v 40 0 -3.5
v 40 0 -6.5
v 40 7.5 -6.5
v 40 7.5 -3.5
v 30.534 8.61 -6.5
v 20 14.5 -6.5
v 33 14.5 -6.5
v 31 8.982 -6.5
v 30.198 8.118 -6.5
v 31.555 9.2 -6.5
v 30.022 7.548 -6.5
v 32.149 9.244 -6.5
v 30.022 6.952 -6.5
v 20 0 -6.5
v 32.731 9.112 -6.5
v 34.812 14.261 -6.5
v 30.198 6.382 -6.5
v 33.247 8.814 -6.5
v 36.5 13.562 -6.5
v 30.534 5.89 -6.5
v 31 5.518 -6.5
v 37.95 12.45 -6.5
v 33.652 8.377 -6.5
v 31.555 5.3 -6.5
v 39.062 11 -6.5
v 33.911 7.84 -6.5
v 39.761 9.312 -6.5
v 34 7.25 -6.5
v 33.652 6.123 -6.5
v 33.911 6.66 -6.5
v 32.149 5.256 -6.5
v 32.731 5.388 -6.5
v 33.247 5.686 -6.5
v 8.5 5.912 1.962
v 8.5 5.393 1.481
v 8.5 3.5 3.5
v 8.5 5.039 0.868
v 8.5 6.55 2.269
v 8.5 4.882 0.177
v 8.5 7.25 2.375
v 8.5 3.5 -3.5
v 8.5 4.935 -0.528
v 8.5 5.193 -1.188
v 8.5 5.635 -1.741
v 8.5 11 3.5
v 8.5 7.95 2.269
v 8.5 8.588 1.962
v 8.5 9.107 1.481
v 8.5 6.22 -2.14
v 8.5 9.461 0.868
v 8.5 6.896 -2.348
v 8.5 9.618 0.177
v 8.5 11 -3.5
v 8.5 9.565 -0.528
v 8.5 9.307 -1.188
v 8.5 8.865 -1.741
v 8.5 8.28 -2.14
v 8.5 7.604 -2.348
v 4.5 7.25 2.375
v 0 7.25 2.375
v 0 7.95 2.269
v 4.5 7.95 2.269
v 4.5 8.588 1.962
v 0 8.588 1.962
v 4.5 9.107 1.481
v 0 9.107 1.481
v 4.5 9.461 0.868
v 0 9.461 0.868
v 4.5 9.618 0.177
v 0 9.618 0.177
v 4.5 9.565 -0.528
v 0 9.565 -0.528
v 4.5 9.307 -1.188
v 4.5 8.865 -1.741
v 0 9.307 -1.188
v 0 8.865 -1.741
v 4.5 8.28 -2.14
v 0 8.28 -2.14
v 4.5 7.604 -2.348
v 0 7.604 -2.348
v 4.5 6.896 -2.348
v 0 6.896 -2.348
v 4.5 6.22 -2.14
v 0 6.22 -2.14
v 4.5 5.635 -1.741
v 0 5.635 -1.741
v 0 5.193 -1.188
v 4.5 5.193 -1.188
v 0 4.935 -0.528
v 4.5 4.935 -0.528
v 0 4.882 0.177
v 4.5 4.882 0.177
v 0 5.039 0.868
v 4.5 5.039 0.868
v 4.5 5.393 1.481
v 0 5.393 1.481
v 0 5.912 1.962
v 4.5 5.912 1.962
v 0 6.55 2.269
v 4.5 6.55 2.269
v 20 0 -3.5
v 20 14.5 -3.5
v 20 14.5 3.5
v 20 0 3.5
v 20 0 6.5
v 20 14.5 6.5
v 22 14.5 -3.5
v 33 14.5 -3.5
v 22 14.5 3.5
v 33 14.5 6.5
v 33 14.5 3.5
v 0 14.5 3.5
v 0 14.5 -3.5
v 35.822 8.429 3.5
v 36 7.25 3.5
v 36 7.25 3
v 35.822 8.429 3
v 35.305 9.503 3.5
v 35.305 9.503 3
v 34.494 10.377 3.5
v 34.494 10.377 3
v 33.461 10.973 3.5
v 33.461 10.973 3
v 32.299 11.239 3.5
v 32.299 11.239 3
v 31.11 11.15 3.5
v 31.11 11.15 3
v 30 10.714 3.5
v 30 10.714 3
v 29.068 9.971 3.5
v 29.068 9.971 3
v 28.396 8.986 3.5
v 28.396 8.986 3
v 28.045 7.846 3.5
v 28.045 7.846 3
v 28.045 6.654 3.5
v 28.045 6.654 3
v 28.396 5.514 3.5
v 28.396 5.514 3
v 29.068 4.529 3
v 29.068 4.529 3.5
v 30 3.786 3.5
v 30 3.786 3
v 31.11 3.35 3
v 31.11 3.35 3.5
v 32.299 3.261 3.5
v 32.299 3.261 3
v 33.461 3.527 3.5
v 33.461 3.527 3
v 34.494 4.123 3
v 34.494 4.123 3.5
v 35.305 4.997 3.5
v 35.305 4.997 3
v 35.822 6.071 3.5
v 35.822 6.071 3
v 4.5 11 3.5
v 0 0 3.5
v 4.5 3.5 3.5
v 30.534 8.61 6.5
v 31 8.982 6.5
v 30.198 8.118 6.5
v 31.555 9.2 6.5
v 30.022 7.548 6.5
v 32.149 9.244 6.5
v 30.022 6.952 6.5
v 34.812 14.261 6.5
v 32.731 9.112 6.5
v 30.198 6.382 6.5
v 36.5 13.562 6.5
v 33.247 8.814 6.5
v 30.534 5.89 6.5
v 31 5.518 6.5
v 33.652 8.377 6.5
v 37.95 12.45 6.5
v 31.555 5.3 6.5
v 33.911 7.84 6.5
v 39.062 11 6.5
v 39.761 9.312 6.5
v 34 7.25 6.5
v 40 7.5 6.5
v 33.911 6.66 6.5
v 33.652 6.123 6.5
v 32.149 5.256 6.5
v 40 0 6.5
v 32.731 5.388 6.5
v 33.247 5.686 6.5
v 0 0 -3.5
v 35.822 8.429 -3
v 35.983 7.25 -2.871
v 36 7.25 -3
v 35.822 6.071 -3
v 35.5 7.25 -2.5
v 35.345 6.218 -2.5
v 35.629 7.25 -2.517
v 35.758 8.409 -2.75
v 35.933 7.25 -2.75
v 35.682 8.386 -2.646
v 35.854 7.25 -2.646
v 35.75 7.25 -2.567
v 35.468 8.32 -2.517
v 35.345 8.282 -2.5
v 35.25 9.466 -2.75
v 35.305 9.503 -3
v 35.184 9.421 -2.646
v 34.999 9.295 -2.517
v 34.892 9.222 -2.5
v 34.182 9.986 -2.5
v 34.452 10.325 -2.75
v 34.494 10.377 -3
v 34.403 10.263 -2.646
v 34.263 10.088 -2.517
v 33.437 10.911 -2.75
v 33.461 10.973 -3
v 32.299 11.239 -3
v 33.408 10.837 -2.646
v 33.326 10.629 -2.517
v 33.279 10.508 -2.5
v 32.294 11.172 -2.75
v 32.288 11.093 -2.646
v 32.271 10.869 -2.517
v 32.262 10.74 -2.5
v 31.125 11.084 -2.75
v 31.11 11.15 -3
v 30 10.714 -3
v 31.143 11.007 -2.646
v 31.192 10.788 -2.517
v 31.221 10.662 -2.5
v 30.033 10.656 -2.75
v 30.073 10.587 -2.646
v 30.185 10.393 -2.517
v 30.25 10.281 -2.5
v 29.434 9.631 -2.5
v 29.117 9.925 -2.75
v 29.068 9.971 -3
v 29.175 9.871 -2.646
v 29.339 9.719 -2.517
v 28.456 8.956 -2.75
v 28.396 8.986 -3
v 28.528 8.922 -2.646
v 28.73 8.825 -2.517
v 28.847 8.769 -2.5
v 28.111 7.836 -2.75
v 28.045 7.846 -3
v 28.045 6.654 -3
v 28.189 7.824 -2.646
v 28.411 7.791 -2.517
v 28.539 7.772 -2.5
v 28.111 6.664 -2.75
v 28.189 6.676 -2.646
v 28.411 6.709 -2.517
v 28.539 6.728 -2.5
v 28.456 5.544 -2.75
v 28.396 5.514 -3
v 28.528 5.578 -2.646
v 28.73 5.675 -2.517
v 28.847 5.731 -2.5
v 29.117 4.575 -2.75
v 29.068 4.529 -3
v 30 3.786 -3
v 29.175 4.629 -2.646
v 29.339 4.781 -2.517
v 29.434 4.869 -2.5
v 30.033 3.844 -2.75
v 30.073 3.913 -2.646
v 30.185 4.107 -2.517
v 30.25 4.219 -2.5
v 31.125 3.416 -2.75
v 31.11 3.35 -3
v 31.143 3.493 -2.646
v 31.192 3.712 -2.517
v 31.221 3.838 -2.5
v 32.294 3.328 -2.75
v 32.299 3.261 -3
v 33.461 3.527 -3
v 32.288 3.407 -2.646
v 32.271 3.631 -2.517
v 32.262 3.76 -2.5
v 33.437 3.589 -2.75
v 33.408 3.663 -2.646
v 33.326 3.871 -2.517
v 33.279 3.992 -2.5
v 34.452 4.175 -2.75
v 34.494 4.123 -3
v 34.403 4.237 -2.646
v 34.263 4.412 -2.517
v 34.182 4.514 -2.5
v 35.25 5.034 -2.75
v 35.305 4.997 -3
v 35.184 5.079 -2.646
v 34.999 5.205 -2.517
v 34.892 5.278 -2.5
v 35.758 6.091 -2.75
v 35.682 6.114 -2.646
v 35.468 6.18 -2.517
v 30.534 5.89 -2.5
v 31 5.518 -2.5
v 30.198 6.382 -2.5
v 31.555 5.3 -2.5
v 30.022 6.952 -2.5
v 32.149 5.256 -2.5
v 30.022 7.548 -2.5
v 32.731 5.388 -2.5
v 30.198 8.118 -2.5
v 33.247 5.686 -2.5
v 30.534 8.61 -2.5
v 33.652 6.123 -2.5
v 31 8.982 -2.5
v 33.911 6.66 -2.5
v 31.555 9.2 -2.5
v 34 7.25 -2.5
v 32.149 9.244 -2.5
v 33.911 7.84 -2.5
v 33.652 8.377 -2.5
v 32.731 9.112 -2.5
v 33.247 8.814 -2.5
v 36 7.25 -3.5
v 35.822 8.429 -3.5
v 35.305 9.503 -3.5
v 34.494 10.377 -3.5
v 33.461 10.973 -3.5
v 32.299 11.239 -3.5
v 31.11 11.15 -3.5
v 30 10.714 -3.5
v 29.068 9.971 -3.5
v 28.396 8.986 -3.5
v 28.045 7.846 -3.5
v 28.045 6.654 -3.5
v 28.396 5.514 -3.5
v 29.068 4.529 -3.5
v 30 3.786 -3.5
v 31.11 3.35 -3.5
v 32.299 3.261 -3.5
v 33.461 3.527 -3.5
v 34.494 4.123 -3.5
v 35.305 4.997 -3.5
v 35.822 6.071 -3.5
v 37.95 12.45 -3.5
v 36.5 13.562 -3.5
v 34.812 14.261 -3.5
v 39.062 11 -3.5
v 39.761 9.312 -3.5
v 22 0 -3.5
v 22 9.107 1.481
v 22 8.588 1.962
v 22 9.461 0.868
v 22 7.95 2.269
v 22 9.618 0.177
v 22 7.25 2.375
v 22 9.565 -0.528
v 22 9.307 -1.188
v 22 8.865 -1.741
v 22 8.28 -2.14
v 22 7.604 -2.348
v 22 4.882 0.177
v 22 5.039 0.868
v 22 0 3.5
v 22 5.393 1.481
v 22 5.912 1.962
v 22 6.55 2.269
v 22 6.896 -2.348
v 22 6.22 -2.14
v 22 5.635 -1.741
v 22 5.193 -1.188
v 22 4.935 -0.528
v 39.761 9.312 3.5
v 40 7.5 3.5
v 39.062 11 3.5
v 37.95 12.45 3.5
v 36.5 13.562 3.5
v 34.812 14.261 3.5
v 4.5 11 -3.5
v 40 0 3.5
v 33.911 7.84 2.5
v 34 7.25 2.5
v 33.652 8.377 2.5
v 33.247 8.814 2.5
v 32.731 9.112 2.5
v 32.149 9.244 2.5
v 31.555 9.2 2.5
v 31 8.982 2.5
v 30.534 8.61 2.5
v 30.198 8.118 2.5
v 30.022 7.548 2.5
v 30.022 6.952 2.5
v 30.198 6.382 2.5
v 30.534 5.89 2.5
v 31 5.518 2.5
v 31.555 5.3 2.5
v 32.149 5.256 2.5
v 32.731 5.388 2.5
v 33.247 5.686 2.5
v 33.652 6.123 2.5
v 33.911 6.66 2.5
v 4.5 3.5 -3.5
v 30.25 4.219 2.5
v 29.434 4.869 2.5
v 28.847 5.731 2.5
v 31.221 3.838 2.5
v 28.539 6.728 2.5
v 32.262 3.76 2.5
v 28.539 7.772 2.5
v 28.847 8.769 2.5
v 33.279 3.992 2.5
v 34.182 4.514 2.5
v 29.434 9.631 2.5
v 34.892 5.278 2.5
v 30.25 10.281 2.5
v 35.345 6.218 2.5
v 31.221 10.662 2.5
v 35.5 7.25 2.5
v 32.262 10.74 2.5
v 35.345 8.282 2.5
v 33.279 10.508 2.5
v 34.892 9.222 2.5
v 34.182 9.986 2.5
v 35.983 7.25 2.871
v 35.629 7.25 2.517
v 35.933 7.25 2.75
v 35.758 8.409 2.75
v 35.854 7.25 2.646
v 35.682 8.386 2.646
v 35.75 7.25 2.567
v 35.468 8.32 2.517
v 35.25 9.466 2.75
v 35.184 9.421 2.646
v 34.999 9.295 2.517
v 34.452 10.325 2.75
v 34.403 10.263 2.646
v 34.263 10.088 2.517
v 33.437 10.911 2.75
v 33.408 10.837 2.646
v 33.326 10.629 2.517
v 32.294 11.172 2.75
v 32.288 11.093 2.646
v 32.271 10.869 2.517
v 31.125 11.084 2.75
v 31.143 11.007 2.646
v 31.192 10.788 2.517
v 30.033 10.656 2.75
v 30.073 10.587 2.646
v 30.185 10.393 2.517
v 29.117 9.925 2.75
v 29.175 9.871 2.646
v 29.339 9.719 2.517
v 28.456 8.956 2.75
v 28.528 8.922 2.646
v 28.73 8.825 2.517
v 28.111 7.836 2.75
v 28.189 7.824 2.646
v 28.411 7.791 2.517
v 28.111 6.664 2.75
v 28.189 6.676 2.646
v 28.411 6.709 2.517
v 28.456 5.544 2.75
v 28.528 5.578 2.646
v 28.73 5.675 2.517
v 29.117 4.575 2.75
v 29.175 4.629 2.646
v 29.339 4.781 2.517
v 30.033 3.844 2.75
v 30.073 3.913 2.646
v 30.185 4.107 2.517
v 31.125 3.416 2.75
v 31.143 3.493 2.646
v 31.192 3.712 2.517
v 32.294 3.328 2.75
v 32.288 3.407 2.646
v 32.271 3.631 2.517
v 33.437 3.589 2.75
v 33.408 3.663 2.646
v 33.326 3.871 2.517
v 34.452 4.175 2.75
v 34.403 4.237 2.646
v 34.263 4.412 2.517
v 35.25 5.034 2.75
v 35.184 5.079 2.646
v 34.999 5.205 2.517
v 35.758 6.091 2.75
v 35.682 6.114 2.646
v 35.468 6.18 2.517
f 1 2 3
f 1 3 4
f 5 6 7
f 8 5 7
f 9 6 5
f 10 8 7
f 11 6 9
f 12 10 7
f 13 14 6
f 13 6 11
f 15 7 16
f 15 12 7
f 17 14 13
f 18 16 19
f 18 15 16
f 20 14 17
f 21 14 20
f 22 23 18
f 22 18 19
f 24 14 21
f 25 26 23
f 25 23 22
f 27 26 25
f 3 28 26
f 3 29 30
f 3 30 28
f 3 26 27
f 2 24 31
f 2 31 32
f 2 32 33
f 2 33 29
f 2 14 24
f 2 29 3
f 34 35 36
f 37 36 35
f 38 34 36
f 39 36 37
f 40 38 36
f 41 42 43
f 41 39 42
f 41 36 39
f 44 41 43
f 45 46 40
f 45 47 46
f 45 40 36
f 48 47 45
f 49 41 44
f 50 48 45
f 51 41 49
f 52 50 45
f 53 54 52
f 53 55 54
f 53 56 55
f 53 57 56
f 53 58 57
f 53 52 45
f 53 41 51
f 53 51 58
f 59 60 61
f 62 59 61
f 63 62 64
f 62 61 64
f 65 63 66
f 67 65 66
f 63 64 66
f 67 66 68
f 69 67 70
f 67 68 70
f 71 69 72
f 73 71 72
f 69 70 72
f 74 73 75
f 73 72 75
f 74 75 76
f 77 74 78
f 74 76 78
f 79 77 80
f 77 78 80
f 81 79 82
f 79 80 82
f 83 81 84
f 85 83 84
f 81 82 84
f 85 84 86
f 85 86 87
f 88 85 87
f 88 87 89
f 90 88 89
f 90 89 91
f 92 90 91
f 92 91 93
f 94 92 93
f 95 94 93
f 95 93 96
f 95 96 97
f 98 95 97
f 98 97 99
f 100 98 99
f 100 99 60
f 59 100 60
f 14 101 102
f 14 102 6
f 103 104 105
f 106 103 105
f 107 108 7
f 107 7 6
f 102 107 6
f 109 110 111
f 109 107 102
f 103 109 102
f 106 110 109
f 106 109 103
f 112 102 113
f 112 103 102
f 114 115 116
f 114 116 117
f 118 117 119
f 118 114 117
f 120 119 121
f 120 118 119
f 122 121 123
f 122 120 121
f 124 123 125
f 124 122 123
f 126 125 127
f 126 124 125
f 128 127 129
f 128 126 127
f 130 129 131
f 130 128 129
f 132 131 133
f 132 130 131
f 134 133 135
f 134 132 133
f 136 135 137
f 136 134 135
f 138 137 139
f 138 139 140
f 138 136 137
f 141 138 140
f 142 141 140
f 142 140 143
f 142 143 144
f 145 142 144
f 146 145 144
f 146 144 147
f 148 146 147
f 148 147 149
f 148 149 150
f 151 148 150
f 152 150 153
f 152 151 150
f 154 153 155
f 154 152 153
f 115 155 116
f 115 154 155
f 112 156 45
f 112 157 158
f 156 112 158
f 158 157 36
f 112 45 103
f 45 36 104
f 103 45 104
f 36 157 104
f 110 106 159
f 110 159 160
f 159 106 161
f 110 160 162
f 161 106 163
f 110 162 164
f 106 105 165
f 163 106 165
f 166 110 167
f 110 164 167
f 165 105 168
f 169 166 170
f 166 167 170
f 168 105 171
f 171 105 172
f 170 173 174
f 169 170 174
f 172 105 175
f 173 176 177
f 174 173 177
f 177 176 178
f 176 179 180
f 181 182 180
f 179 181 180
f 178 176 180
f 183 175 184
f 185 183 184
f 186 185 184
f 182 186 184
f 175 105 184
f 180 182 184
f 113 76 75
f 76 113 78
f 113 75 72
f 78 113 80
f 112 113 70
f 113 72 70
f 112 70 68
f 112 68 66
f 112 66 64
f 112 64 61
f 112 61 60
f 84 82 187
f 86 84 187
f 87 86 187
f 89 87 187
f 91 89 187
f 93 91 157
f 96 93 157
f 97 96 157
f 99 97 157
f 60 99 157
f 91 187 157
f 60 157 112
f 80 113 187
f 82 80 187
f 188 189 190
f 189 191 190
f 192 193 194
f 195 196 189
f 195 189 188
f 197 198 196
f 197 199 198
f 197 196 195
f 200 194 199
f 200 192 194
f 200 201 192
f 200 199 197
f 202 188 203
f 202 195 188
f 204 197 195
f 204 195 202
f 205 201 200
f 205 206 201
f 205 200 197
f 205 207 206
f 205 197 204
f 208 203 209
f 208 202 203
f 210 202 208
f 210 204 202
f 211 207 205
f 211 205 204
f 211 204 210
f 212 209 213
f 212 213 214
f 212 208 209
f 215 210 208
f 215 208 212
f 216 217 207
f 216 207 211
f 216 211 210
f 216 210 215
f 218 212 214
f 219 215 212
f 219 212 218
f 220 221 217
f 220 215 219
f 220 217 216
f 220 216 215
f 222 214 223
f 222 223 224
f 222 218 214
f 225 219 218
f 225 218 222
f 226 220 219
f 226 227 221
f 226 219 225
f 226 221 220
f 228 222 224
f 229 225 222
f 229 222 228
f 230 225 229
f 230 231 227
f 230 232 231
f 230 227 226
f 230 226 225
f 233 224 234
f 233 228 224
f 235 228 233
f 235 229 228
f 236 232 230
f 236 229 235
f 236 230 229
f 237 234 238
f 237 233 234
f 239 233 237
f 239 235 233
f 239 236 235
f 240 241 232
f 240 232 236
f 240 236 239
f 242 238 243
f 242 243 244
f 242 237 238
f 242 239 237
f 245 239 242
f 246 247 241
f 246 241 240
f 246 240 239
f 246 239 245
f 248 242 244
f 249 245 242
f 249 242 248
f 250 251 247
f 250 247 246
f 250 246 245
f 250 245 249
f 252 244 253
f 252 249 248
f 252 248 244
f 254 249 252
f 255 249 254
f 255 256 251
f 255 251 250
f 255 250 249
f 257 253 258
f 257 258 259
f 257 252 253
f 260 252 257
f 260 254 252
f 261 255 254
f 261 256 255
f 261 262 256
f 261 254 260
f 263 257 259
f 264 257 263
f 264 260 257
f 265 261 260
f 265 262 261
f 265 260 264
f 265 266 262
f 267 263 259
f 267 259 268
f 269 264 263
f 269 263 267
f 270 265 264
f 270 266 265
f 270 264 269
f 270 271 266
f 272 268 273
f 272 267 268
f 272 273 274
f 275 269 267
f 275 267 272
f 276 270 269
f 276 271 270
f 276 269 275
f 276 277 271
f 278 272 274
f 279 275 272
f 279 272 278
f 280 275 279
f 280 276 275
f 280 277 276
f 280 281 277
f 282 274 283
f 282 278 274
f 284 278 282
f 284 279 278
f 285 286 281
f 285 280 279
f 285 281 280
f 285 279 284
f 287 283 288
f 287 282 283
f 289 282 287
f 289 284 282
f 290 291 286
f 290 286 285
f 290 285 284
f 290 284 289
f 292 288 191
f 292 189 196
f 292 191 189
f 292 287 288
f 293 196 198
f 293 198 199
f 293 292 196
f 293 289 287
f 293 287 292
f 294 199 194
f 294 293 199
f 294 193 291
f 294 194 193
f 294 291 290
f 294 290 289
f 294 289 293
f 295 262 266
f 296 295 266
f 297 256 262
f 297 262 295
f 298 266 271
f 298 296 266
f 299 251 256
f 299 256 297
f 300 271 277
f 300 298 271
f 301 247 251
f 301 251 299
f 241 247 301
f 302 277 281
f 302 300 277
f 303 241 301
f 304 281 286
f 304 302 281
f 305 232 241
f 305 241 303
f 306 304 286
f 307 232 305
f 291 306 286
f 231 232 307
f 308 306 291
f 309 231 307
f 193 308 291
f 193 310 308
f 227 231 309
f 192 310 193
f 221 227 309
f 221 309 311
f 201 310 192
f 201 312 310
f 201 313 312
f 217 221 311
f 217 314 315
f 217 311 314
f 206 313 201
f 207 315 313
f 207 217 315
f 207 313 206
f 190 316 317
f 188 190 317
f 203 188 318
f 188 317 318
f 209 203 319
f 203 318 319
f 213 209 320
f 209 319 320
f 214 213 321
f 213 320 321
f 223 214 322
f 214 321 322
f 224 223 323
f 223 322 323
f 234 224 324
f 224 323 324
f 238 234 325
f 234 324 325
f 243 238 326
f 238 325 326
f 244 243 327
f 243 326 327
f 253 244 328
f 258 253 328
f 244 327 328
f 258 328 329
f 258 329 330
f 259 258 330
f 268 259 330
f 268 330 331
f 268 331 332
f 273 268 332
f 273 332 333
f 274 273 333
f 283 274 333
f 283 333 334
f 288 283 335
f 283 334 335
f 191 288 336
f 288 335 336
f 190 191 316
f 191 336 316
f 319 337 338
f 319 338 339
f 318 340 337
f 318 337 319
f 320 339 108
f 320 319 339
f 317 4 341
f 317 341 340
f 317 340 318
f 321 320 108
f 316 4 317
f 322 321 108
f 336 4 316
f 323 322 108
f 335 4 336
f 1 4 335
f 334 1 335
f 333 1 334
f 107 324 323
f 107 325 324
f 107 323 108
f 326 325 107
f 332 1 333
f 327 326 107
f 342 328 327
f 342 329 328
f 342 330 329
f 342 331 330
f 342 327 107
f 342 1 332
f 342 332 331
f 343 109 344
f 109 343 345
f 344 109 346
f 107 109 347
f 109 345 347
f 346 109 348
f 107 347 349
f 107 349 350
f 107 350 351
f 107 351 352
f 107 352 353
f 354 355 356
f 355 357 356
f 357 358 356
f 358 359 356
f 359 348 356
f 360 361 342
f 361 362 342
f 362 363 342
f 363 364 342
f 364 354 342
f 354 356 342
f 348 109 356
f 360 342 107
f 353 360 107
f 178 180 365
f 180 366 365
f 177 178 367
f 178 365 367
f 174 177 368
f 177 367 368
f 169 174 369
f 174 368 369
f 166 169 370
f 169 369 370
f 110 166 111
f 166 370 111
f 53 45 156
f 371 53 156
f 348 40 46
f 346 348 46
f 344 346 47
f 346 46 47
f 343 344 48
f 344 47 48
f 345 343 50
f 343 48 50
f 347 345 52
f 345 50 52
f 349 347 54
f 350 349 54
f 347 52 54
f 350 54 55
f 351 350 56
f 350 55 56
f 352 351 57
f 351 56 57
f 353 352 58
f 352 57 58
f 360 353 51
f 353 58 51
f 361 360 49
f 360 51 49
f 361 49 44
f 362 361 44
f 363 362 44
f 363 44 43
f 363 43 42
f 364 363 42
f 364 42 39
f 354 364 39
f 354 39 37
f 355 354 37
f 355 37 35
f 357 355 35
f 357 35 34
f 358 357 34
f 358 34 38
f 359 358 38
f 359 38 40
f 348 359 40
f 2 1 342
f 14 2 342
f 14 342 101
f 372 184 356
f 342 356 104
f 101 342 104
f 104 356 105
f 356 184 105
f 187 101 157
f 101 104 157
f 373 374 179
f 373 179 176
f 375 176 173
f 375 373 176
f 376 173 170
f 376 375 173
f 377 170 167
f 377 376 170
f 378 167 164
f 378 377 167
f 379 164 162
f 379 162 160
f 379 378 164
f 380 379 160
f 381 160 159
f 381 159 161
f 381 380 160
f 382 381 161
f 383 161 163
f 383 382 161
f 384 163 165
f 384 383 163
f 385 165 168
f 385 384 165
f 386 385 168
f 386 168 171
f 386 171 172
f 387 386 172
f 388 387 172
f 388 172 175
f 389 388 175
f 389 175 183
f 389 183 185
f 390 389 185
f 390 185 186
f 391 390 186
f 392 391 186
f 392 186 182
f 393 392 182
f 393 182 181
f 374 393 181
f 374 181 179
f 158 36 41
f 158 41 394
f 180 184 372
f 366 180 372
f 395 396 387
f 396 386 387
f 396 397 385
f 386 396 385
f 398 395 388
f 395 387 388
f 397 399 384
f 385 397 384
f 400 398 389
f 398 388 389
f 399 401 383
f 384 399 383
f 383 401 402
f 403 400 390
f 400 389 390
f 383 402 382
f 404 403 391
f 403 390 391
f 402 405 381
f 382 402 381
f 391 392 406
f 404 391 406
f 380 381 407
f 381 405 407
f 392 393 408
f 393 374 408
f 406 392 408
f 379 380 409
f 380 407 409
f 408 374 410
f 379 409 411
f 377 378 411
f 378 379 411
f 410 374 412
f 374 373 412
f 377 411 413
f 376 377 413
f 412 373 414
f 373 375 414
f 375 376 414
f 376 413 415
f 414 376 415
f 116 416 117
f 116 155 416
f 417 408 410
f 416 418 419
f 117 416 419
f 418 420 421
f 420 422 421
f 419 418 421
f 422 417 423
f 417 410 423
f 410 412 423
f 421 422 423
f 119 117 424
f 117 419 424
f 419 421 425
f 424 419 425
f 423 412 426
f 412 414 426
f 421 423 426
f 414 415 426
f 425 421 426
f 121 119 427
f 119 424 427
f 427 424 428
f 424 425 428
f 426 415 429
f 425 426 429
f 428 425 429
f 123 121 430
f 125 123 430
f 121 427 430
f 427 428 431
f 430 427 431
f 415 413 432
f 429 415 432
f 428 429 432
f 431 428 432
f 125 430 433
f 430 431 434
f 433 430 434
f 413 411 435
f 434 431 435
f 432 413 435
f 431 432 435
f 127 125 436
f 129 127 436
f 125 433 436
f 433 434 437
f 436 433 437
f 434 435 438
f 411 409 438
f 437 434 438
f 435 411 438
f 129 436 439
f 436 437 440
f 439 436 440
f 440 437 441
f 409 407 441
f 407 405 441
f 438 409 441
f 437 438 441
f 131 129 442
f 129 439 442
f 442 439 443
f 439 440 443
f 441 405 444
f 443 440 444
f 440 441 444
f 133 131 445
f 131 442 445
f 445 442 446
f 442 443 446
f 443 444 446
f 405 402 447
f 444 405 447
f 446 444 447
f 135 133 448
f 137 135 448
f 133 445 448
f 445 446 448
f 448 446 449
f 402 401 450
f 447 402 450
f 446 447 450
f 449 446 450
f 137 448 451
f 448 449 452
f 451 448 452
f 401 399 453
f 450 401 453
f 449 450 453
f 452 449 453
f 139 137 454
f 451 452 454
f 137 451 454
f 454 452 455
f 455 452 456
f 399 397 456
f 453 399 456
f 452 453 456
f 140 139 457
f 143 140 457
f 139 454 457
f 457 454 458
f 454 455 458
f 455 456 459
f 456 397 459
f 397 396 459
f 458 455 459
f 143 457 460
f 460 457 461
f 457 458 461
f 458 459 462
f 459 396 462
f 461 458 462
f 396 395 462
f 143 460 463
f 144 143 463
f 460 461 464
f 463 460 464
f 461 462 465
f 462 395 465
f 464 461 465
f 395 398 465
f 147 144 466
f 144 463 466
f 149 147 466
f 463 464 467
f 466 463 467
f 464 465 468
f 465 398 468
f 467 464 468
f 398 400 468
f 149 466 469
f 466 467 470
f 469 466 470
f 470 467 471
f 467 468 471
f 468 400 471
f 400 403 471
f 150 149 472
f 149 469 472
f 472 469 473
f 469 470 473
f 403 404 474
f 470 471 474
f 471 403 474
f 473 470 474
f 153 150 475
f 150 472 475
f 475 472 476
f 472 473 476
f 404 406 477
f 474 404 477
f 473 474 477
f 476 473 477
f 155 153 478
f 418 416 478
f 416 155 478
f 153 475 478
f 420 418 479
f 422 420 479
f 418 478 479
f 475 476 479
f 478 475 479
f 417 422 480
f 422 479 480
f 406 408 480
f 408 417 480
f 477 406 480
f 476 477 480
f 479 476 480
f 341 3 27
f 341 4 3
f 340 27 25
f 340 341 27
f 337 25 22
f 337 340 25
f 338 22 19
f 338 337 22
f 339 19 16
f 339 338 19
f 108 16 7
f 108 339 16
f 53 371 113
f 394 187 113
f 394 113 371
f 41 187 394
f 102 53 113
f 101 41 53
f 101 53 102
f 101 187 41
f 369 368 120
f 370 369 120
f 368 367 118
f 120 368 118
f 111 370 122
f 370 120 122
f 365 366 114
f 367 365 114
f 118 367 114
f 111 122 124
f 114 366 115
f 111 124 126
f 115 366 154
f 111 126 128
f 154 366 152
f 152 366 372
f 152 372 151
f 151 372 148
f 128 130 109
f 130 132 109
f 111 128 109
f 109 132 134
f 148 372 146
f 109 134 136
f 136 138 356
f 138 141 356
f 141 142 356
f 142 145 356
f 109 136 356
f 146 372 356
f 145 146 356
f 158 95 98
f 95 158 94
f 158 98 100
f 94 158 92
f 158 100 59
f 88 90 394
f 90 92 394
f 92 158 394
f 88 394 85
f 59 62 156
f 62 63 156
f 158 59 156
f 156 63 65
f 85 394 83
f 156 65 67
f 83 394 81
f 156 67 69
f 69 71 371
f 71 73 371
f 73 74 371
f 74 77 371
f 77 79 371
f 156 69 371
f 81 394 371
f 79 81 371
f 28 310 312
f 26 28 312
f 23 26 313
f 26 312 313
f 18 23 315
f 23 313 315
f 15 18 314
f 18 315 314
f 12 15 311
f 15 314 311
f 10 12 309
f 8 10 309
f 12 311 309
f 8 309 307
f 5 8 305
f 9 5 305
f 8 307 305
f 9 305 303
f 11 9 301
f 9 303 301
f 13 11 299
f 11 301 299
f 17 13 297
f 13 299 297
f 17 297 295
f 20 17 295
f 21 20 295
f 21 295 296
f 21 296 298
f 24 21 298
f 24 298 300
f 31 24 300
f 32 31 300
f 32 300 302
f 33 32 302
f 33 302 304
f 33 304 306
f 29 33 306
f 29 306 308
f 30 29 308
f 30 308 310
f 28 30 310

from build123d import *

# Parameters (mm, degrees)
BOSS_EXTRU_1_DEPTH      = 14.5
CONG_5_R                = 7
ESQUISSE3_R             = 4
BOSS_EXTRU_2_DEPTH      = 1
CONG_2_R                = 0.5
ESQUISSE4_R             = 2
ENL_V_MAT_EXTRU_1_DEPTH = 5
ESQUISSE5_R             = 2.375
ENL_V_MAT_EXTRU_2_DEPTH = 41
ESQUISSE6_W             = 4
ESQUISSE6_H             = 7.5
ENL_V_MAT_EXTRU_3_DEPTH = 11


with BuildPart() as part:
    # Esquisse2 → Boss.-Extru.1 (new body)
    with BuildSketch(Plane(origin=(0, 0, 0), x_dir=(1, 0, 0), z_dir=(0, 1, 0))):
        Polygon((0, 0), (0, 3.5), (20, 3.5), (20, 6.5), (40, 6.5), (40, 3.5), (22, 3.5), (22, 0), align=None)
    extrude(amount=BOSS_EXTRU_1_DEPTH)

    # Congé5
    cong_5_edges = [part.edges().sort_by_distance(p)[0] for p in [
        (40, 14.5, -5),
    ]]
    fillet(cong_5_edges, radius=CONG_5_R)

    # Esquisse3 → Boss.-Extru.2 (add)
    with BuildSketch(Plane.XY.offset(-3.5)):
        with Locations((32, 7.25)):
            Circle(ESQUISSE3_R)
    extrude(amount=BOSS_EXTRU_2_DEPTH)

    # Congé2
    cong_2_edges = [part.edges().sort_by_distance(p)[0] for p in [
        (28, 7.25, -2.5),
    ]]
    fillet(cong_2_edges, radius=CONG_2_R)

    # Esquisse4 → Enlèv. mat.-Extru.1 (cut, through all)
    with BuildSketch(Plane.XY.offset(-2.5)):
        with Locations((32, 7.25)):
            Circle(ESQUISSE4_R)
    extrude(amount=-ENL_V_MAT_EXTRU_1_DEPTH, mode=Mode.SUBTRACT)

    # Symétrie1: part across plane


with BuildPart() as part_1:
    add(part.part)
    add(part.part.mirror(Plane(origin=(22, 14.5, 0), x_dir=(1, 0, 0), z_dir=(0, 0, -1))))

    # Esquisse5 → Enlèv. mat.-Extru.2 (cut, through all)
    with BuildSketch(Plane.ZY):
        with Locations((0, 7.25)):
            Circle(ESQUISSE5_R)
    extrude(amount=-ENL_V_MAT_EXTRU_2_DEPTH, mode=Mode.SUBTRACT)

    # Esquisse6 → Enlèv. mat.-Extru.3 (cut, through all)
    with BuildSketch(Plane(origin=(0, 0, -3.5), x_dir=(-1, 0, 0), z_dir=(0, 0, -1))):
        with Locations((-6.5, 7.25)):
            Rectangle(ESQUISSE6_W, ESQUISSE6_H)
    extrude(amount=-ENL_V_MAT_EXTRU_3_DEPTH, mode=Mode.SUBTRACT)


solid = part_1.part
